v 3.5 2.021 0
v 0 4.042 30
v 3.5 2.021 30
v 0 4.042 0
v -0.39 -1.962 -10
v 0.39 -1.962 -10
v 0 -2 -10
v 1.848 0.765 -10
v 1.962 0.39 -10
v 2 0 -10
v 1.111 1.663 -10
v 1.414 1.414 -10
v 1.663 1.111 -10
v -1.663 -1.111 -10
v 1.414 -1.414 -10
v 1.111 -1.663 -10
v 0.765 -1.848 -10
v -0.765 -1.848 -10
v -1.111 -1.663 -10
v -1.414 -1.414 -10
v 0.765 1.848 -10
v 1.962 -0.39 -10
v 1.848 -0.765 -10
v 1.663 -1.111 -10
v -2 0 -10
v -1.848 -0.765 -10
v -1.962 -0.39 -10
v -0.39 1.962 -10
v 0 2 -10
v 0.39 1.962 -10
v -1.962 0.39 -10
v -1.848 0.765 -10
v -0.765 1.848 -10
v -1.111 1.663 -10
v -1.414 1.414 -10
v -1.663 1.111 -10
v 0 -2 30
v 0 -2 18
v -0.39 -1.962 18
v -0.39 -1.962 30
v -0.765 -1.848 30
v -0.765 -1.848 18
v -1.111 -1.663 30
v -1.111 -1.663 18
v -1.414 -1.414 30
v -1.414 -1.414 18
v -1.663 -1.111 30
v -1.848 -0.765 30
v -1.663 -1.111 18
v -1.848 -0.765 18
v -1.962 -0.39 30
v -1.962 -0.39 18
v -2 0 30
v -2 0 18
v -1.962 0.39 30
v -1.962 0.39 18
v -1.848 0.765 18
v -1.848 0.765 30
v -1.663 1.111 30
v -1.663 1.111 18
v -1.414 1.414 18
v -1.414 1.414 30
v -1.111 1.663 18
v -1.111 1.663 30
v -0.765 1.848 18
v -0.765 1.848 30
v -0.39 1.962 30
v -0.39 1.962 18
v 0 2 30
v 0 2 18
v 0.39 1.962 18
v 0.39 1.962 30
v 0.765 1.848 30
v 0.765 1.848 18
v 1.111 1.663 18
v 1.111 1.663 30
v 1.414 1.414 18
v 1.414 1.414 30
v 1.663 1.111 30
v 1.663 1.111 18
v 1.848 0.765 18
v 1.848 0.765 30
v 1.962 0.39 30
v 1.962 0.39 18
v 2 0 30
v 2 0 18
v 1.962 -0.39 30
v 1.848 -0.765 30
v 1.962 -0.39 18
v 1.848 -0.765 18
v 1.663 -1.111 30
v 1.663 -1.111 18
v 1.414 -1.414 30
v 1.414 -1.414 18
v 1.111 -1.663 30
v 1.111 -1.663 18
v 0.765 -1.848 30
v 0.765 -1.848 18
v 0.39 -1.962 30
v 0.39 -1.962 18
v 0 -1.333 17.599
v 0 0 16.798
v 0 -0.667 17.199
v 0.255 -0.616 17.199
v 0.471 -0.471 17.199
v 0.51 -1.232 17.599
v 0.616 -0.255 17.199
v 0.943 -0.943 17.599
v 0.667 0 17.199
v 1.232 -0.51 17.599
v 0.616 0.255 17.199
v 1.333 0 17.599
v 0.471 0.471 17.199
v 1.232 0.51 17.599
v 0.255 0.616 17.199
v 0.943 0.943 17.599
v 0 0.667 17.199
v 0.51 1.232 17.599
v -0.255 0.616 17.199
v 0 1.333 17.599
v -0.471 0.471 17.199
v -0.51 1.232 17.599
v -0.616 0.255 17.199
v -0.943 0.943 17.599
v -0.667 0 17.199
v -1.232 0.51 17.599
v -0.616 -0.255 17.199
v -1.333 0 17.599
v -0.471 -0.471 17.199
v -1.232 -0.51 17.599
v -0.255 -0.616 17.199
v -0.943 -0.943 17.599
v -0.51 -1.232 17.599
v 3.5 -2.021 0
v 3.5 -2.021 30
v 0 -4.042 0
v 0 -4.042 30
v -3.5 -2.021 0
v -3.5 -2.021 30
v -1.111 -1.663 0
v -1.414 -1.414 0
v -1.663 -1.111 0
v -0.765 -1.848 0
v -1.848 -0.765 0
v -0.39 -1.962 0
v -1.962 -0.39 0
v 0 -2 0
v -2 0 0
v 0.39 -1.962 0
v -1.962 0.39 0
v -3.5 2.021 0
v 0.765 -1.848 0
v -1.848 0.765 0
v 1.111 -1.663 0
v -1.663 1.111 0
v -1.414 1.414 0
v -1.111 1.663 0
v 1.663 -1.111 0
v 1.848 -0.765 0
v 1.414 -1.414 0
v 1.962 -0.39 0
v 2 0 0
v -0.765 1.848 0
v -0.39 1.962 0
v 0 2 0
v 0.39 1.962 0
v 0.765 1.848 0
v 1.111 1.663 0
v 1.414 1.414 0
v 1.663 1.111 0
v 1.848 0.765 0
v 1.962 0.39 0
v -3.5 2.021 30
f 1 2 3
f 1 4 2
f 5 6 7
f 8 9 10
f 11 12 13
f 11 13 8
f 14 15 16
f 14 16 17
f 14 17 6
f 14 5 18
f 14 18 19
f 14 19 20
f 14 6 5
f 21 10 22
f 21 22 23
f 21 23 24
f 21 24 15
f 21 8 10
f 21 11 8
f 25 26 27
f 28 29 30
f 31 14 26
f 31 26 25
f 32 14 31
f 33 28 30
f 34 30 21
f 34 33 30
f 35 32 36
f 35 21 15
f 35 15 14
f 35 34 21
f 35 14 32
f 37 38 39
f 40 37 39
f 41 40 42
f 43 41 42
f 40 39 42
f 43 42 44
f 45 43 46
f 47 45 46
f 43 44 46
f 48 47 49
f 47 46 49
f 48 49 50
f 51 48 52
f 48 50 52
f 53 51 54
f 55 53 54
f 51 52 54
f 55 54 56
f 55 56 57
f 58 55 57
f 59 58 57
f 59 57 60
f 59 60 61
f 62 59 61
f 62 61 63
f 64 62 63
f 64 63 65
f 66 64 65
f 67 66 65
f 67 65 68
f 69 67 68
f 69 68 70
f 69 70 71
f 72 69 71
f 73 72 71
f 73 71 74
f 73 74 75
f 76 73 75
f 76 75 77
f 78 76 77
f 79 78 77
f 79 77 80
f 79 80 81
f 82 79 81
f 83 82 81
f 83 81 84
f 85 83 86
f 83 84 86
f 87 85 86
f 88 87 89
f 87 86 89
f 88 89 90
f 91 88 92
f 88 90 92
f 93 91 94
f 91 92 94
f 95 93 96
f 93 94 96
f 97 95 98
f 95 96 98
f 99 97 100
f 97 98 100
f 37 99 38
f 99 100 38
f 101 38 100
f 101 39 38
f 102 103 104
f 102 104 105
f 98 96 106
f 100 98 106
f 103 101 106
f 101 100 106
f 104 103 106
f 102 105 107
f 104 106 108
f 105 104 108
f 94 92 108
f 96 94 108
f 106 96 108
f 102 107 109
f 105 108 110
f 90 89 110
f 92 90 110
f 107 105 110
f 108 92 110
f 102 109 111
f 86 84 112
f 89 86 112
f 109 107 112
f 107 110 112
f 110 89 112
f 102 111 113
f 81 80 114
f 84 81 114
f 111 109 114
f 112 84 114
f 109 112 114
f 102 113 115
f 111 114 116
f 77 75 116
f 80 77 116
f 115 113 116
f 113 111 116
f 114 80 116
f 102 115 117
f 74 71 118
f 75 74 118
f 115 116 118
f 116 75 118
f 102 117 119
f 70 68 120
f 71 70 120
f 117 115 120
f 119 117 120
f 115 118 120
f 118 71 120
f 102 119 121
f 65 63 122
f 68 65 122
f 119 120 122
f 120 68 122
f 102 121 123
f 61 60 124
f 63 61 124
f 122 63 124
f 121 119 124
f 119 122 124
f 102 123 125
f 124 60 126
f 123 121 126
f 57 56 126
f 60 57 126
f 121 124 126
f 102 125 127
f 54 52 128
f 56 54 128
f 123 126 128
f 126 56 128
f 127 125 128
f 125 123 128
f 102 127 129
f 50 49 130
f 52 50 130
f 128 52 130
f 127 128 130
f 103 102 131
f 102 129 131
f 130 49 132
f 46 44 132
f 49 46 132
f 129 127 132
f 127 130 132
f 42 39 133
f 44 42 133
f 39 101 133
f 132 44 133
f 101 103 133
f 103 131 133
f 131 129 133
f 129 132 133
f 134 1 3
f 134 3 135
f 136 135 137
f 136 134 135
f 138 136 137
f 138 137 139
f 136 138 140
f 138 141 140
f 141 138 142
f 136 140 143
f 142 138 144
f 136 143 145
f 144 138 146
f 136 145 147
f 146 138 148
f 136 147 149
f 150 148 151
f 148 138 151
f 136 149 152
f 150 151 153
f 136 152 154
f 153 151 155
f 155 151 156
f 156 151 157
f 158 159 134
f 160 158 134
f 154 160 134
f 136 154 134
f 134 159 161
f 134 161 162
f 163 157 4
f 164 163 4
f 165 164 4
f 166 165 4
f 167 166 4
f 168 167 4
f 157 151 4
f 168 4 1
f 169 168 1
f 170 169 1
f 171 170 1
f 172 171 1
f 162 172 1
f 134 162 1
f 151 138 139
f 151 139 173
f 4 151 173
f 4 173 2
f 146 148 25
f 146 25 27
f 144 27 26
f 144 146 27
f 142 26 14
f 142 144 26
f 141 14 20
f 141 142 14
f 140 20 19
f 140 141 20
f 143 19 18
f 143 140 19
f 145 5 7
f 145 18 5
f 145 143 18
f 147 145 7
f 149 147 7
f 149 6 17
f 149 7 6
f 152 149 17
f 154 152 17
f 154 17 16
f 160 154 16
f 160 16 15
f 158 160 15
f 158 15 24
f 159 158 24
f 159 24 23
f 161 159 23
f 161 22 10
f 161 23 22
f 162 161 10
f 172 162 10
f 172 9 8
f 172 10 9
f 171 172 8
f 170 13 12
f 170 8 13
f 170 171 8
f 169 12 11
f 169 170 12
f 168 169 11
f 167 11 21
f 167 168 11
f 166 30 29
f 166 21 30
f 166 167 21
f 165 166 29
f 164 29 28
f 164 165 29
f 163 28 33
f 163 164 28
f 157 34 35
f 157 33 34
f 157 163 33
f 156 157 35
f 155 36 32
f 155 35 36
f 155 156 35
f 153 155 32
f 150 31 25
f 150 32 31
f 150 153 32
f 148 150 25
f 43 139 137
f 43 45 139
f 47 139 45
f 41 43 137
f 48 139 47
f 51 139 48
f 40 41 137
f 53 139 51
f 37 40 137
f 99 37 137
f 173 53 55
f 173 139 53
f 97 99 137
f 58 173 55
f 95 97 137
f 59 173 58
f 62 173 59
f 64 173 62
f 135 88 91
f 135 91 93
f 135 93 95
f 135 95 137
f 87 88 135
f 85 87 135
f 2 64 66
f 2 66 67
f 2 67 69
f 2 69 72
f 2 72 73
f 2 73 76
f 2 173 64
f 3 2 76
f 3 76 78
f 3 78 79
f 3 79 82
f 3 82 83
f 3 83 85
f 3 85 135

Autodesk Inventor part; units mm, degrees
ref_plane "YZ Plane" through (0, 0, 0) normal (1, 0, 0) x (0, 1, 0)
ref_plane "XZ Plane" through (0, 0, 0) normal (0, 1, 0) x (-1, 0, 0)
ref_plane "XY Plane" through (0, 0, 0) normal (0, 0, 1) x (1, 0, 0)
sketch "スケッチ1" plane through (0, 0, 0) normal (0, 0, 1) x (1, 0, 0)
  circle A0 centre (0, 0) radius 3.5 construction
  line L0 (3.5, -2.0207) -> (0, -4.0415)
  line L1 (0, -4.0415) -> (-3.5, -2.0207)
  line L2 (-3.5, -2.0207) -> (-3.5, 2.0207)
  line L3 (-3.5, 2.0207) -> (0, 4.0415)
  line L4 (0, 4.0415) -> (3.5, 2.0207)
  line L5 (3.5, 2.0207) -> (3.5, -2.0207)
  point P0 (3.5, 0)
  dimension "d0" = 7
extrude "押し出し1" add sketch "スケッチ1" along normal blind 30
sketch "スケッチ2" plane through (0, 0, 30) normal (0, 0, 1) x (1, 0, 0)
  point P0 (0, 0)
  point P1 (0, 0)
hole "穴1" at (0, 0, 30) direction (0, 0, -1) diameter 4 depth 12 tip angle 118
sketch "スケッチ3" plane through (0, 0, 0) normal (0, 0, -1) x (-1, 0, 0)
  circle A0 centre (0, 0) radius 2
  dimension "d10" = 4
extrude "押し出し2" add sketch "スケッチ3" along normal blind 10
properties part number "六角スペーサー" material "鉄、ダクタイル鋳鉄"
